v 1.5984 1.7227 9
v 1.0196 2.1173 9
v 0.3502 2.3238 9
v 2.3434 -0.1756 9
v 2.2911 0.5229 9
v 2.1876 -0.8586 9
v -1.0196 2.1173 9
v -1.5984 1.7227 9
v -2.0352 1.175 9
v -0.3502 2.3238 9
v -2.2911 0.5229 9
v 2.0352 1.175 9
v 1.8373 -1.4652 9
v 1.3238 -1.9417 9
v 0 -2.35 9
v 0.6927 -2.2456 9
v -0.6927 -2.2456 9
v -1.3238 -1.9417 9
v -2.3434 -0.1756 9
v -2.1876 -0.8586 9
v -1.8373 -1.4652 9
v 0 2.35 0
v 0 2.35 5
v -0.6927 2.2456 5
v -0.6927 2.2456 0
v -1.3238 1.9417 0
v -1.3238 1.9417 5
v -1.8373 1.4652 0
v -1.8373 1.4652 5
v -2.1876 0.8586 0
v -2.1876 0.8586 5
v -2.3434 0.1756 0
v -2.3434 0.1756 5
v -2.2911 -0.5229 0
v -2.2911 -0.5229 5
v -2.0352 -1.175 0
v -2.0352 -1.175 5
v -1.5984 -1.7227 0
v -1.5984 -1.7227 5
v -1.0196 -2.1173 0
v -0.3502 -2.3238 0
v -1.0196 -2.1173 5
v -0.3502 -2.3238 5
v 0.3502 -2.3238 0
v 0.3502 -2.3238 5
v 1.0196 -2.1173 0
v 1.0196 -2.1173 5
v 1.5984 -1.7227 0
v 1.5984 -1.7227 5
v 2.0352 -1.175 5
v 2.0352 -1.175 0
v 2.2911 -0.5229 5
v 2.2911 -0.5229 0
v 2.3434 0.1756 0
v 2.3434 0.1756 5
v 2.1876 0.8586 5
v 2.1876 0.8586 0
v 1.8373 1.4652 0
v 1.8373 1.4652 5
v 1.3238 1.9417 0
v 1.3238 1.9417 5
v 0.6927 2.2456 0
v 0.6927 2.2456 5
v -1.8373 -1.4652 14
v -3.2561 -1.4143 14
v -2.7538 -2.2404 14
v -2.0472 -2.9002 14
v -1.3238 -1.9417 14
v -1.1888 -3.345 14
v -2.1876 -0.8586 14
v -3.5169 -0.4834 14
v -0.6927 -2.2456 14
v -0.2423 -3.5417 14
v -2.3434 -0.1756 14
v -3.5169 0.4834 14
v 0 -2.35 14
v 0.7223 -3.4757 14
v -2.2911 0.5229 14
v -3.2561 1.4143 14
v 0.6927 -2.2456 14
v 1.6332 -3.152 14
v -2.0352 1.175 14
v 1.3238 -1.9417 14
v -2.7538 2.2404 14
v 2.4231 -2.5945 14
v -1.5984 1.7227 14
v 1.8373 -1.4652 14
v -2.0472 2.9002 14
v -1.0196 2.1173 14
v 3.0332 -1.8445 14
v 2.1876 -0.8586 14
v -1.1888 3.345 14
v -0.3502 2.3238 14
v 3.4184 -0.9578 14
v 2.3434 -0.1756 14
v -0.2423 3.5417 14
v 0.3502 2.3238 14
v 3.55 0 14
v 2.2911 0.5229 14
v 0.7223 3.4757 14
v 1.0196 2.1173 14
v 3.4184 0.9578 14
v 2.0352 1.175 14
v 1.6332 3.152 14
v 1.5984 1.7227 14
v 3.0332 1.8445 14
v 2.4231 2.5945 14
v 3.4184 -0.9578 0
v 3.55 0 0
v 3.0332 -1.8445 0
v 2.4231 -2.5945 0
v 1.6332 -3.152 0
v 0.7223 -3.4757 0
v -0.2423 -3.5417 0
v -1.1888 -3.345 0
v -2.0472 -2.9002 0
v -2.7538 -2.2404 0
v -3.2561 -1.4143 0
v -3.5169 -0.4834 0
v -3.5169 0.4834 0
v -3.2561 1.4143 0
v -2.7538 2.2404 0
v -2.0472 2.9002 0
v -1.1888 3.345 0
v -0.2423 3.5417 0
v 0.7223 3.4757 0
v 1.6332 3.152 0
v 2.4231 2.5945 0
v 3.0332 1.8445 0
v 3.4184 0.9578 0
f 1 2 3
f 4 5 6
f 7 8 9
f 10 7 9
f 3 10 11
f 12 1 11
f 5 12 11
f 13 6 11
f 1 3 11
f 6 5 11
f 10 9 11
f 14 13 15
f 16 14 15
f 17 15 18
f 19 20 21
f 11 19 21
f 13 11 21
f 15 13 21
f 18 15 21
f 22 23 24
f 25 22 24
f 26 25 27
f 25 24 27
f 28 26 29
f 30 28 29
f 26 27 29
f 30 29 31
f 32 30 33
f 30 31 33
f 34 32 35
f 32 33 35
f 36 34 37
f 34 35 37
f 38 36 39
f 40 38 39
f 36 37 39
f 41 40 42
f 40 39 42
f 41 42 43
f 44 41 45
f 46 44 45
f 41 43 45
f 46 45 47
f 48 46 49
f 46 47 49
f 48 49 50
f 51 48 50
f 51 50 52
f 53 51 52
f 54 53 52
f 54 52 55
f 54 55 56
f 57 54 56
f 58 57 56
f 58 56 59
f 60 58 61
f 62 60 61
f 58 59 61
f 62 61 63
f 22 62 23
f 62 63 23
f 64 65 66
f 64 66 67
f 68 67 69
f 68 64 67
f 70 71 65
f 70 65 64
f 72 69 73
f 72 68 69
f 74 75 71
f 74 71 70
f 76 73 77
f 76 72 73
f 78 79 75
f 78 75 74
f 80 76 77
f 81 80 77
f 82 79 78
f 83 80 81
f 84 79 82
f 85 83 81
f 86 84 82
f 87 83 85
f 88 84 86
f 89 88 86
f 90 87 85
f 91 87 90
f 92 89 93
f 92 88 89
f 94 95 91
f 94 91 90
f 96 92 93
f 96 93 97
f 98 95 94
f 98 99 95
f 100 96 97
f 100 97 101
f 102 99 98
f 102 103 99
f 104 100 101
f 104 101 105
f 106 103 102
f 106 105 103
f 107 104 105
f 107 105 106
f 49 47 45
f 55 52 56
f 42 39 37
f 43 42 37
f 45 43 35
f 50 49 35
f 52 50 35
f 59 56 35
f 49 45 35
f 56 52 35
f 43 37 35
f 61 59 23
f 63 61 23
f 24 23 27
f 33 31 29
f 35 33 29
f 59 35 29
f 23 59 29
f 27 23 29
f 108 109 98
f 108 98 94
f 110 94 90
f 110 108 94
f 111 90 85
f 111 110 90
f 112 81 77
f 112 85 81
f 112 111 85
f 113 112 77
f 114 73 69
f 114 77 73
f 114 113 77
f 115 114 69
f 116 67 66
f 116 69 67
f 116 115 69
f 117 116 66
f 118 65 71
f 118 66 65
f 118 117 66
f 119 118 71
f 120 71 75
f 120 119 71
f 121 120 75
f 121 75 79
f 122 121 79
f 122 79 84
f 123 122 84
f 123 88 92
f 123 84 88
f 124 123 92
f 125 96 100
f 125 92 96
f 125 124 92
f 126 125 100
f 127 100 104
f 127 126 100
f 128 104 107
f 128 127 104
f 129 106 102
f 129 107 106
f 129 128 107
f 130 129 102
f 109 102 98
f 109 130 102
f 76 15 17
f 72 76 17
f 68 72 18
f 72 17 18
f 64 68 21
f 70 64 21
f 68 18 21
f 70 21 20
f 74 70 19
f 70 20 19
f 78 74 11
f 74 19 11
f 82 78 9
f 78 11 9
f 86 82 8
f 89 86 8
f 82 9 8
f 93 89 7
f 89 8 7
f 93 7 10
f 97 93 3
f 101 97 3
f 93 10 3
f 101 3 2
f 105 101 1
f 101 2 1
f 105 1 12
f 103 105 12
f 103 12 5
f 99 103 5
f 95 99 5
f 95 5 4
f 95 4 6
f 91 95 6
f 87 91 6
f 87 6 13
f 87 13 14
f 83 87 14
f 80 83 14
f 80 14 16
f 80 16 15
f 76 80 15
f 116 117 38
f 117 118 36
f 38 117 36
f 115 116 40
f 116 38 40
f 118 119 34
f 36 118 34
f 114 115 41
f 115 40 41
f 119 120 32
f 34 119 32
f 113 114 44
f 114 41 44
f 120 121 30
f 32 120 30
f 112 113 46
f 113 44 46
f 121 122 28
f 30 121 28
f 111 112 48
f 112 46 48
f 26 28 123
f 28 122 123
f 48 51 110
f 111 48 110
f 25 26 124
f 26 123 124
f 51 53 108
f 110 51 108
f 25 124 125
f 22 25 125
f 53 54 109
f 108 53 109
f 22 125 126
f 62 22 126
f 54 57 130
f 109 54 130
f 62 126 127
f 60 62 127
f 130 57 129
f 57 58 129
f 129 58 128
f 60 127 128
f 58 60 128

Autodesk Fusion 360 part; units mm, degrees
sketch "Sketch1" plane through (0, 0, 0) normal (0, 0, 1) x (1, 0, 0)
  circle A0 centre (0, 0) radius 3.55
  dimension "d1" = 7.1
extrude "Extrude1" add sketch "Sketch1" along normal blind 14
hole "Hole1" at (0, 0, 14) direction (0, 0, -1) diameter 4.7 depth 5 tip angle 180
hole "Hole2" at (0, 0, 0) direction (0, 0, 1) diameter 4.7 depth 5 tip angle 180
